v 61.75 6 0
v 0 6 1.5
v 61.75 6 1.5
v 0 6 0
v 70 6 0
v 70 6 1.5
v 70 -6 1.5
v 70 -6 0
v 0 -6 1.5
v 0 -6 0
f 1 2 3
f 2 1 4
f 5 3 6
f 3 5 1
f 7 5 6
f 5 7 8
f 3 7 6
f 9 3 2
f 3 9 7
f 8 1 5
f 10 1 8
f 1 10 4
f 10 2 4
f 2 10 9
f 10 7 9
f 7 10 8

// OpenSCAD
// 10-well agarose gel comb - flat plate with spine and hanging teeth.
// Orientation: Lying flat on XY plane, spine along X, teeth hanging in -Y.

// Dimensions
spine_len = 70;
spine_w   = 12;
comb_thk  = 1.5;

tooth_w   = 5.0;
tooth_l   = 12;
tooth_gap = 1.5;
num_teeth = 10;

$fn = 64;

// Calculate total width of the tooth row (teeth + gaps)
tooth_row_w = num_teeth * tooth_w + (num_teeth - 1) * tooth_gap;

// Position the tooth row so it is centred on the spine in X
tooth_row_x_start = -(spine_len - tooth_row_w) / 2;

difference() {
    // 1. The main spine (back bar)
    translate([0, -spine_w / 2, 0]) 
        cube([spine_len, spine_w, comb_thk]);

    // 2. The wells (cutting shapes)
    // We iterate through each tooth position and cut out the tooth AND the gap.
    // This creates the empty space for the agarose well.
    for (i = [0 : num_teeth - 1]) {
        tx = tooth_row_x_start + i * (tooth_w + tooth_gap);
        
        // Calculate the width of the cut: tooth width + gap width
        cut_w = tooth_w + tooth_gap;
        
        // The cut extends slightly past the spine thickness to ensure clean separation
        translate([tx, spine_w / 2, 0]) 
            cube([cut_w, tooth_l + 0.1, comb_thk + 0.1]);
    }
}
